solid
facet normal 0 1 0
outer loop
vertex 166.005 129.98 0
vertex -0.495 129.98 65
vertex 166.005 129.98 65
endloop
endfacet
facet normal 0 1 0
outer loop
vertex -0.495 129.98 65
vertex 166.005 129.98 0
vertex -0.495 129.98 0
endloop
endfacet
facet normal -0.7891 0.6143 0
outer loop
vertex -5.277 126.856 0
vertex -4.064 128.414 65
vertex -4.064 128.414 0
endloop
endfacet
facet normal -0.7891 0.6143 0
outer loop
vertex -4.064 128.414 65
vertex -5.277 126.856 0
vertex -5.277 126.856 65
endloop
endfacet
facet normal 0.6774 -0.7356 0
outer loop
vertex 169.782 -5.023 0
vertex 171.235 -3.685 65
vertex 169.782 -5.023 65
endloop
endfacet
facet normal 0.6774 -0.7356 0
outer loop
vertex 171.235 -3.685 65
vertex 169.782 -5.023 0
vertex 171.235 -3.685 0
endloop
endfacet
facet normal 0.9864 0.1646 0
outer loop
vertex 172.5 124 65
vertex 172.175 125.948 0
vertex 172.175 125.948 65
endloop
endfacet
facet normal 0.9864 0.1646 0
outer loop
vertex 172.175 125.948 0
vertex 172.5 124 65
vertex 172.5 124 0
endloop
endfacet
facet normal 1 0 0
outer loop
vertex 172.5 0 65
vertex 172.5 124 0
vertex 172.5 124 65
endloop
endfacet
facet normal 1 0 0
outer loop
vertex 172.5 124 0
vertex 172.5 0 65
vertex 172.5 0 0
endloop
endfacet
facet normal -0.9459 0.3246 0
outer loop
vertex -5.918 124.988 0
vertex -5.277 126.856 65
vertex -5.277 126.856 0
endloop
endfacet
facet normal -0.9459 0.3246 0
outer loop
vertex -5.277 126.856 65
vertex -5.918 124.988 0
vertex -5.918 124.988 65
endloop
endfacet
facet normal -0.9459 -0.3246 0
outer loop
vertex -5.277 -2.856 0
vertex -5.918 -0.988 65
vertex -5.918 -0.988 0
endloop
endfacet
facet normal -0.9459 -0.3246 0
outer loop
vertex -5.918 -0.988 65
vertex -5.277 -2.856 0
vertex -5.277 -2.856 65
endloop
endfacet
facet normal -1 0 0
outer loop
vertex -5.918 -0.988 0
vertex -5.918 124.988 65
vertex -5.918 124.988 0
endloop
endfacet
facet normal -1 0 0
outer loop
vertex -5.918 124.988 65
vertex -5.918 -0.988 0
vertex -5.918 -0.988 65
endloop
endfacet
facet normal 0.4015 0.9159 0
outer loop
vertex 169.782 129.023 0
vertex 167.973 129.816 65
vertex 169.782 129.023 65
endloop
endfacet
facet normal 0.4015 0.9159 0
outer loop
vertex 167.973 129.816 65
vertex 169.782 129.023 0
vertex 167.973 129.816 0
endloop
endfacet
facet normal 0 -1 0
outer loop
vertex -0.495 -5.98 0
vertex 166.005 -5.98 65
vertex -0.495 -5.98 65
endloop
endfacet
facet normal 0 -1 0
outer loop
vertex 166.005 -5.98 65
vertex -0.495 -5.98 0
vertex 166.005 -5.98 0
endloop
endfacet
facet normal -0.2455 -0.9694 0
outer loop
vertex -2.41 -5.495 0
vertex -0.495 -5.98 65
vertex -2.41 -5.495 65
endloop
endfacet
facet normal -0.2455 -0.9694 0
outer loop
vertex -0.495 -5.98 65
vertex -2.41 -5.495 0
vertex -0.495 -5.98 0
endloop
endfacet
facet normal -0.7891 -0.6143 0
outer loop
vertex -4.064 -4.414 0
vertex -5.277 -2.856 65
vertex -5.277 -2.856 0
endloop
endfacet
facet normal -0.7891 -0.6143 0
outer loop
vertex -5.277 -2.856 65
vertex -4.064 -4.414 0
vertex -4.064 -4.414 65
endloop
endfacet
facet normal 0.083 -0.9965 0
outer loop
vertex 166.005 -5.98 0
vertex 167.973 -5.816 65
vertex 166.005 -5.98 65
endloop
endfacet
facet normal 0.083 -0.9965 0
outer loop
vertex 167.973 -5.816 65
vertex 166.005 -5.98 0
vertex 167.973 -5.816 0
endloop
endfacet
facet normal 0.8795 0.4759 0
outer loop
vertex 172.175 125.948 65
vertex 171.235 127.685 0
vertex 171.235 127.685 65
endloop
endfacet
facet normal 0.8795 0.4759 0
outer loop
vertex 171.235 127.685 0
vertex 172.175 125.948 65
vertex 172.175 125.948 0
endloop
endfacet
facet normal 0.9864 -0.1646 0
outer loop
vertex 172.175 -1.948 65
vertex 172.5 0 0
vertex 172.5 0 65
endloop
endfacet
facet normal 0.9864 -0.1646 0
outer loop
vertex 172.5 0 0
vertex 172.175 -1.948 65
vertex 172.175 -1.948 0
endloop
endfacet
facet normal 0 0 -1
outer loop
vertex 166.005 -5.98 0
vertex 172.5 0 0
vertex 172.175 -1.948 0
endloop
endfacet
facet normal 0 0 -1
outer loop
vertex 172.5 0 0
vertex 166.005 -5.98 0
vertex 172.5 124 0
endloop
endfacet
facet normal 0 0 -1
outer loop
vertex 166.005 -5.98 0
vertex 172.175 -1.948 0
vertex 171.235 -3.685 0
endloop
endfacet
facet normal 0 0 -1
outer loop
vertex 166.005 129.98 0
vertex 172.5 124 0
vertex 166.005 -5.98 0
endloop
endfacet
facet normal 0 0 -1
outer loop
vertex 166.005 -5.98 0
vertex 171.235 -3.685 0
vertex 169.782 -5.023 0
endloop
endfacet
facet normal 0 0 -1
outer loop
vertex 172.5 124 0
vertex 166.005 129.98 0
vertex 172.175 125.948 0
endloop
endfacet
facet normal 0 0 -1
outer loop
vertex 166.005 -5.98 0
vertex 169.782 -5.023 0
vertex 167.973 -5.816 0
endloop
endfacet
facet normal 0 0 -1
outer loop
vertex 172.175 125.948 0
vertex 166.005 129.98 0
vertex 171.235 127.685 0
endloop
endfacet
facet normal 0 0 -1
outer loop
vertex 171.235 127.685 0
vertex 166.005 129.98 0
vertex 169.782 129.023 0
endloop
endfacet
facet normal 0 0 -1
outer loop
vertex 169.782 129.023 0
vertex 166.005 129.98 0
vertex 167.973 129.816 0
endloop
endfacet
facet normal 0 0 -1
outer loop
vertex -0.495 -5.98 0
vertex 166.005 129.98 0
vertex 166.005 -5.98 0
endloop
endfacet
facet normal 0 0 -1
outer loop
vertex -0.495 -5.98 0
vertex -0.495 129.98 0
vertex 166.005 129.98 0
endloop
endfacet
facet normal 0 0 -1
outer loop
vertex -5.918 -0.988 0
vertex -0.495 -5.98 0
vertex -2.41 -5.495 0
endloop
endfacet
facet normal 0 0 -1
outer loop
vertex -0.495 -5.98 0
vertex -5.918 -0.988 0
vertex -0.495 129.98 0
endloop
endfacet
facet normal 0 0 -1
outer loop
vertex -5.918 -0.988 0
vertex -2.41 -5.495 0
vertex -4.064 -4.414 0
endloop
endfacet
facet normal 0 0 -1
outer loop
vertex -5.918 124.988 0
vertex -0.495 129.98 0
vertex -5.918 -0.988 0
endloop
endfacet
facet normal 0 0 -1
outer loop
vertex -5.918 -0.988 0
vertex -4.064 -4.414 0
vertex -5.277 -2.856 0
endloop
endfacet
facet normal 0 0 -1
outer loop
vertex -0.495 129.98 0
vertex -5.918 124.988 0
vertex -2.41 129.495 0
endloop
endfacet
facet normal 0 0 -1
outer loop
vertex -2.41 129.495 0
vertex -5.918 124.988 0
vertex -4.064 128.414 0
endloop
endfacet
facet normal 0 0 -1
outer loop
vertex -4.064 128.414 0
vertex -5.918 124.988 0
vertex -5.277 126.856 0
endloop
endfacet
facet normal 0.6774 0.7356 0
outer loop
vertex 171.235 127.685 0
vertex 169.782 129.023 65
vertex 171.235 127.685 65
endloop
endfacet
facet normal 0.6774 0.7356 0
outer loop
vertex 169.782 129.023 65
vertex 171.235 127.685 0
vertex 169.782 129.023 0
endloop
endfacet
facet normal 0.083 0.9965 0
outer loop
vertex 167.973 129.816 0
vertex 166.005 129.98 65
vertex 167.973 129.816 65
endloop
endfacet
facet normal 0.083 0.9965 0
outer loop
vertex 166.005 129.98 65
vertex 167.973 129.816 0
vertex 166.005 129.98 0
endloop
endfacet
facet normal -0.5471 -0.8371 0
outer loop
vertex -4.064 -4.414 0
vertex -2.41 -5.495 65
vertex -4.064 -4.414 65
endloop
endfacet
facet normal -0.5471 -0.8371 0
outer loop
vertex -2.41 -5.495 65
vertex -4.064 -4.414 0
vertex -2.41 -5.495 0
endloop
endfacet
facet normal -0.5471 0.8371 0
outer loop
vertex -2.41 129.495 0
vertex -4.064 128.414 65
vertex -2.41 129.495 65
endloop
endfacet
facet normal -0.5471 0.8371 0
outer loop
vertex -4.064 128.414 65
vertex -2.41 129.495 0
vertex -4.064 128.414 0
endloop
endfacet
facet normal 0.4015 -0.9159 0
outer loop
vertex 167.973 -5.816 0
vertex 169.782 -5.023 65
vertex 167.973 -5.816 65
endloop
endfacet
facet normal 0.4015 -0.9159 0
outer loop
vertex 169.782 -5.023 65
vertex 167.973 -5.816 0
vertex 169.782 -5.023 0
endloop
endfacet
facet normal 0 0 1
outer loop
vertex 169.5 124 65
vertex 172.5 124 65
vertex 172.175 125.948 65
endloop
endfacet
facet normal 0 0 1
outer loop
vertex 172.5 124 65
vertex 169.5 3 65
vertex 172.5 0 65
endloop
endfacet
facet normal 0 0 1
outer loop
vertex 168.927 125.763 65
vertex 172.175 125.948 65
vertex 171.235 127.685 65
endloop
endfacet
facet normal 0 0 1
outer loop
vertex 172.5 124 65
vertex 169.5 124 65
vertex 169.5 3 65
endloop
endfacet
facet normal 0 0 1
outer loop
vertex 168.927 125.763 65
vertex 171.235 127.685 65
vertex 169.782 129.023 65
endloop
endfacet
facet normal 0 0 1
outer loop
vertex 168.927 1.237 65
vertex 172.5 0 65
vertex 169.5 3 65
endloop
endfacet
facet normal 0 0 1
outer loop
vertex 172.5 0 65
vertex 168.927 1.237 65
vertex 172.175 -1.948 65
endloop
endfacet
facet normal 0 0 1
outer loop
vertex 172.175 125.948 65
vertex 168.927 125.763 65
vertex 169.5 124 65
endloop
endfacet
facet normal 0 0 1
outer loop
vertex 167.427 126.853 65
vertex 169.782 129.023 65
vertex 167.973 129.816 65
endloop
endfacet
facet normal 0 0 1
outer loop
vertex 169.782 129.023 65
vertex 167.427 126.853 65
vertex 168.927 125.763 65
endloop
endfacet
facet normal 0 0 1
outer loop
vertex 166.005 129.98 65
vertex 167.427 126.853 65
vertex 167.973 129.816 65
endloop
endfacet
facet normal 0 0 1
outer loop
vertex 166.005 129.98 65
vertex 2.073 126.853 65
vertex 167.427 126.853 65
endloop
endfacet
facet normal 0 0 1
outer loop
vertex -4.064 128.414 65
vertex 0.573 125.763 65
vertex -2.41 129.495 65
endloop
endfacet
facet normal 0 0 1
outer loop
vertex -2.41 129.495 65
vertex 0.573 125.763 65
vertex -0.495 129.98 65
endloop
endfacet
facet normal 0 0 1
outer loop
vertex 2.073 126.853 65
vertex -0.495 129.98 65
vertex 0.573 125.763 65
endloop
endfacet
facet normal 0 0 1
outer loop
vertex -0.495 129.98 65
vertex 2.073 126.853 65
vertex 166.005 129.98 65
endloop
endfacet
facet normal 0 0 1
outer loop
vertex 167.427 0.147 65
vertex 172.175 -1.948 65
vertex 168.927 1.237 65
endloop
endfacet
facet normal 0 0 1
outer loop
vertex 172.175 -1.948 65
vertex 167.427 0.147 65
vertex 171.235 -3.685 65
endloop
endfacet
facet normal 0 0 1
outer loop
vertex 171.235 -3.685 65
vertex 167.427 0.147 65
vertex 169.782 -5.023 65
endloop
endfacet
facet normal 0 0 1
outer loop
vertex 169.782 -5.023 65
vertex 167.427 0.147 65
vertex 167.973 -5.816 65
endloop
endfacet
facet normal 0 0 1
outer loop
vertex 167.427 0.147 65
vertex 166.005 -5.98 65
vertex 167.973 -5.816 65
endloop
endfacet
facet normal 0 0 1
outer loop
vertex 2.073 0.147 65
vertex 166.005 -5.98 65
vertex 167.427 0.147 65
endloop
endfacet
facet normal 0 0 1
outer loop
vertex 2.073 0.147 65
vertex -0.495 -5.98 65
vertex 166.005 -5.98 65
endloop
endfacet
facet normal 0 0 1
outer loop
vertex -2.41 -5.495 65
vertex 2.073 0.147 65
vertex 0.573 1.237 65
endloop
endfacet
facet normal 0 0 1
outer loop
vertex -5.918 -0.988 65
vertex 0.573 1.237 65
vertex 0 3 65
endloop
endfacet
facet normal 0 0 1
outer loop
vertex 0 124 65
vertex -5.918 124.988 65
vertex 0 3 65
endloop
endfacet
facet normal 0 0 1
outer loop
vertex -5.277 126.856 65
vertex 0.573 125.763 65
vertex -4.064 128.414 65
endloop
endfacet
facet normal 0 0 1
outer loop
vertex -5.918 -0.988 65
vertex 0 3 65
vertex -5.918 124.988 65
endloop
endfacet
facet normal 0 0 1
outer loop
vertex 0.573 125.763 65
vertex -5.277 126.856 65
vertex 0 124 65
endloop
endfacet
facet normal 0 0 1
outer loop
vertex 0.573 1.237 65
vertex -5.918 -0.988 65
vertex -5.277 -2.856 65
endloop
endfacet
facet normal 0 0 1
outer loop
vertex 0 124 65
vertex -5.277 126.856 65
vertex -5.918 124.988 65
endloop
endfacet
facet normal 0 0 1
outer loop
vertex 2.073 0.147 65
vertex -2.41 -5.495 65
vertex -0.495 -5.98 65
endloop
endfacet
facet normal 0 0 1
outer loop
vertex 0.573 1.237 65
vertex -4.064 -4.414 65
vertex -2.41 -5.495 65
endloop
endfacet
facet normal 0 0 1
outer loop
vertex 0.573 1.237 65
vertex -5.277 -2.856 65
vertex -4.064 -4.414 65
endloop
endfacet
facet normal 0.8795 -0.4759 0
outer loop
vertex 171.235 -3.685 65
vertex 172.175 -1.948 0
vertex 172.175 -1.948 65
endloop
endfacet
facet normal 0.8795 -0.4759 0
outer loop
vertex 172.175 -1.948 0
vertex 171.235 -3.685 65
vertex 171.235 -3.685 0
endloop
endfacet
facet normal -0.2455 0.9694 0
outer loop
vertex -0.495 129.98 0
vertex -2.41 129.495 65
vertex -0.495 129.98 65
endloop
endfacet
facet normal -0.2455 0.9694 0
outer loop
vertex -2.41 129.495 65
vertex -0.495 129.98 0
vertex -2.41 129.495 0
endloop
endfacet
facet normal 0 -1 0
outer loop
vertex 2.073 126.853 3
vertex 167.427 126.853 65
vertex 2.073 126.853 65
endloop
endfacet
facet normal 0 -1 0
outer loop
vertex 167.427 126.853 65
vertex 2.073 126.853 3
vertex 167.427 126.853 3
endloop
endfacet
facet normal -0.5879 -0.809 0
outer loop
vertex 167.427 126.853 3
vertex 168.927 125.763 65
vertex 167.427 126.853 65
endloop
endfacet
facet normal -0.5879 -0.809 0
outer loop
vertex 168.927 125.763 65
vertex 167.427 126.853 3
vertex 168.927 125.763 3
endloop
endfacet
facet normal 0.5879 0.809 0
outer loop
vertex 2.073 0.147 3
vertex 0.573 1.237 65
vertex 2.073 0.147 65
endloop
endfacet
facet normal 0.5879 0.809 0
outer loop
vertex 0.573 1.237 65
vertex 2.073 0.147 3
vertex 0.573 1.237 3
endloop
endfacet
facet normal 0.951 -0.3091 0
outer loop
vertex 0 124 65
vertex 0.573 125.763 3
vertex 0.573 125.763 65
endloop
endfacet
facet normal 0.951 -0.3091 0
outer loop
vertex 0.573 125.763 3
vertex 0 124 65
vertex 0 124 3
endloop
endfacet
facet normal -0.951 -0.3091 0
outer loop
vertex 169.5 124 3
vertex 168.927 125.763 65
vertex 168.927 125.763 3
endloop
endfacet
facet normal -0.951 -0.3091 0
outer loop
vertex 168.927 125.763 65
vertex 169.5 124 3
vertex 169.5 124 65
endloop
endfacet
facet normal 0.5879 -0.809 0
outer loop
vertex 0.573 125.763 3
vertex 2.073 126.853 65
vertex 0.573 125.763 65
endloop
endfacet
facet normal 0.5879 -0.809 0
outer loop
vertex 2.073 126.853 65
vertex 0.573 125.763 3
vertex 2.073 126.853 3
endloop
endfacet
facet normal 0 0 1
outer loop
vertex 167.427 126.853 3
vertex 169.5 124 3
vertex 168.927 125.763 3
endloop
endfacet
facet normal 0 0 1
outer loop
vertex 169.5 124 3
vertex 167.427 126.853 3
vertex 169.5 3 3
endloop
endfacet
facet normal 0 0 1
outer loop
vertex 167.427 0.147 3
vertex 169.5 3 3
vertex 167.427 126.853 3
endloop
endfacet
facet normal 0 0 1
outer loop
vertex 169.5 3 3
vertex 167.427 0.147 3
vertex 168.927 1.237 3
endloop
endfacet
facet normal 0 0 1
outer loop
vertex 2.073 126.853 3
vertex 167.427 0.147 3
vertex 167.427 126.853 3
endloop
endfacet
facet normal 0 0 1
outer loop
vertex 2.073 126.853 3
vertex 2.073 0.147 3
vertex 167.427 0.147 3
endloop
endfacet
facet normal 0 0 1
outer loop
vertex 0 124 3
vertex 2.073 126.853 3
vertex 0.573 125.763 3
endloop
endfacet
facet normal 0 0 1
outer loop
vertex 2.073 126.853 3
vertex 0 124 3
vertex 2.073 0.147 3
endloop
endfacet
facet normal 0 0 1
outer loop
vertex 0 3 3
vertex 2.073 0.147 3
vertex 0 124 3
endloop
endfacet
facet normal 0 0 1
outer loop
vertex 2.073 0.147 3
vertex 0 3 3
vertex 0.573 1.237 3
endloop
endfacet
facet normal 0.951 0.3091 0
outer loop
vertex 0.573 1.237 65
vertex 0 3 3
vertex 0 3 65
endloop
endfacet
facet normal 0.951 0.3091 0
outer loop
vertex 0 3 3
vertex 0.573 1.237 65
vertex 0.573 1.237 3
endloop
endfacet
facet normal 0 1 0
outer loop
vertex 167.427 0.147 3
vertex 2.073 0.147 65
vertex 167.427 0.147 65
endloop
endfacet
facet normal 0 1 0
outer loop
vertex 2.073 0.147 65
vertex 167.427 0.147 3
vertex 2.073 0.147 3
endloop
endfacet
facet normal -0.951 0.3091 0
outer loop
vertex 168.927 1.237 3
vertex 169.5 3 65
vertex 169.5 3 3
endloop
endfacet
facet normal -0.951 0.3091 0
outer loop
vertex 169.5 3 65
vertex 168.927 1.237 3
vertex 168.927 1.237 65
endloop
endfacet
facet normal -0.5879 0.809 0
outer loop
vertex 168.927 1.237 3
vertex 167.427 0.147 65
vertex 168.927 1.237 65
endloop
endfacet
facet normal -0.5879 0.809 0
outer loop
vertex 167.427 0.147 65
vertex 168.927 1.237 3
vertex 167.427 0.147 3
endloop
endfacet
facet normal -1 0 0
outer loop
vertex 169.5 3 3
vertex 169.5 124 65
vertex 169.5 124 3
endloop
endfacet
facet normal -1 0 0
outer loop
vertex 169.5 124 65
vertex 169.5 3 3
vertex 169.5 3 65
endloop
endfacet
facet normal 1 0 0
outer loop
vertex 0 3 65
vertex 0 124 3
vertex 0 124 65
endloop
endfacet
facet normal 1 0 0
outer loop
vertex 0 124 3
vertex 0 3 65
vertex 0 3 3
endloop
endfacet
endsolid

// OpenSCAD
// Plug tray (12-cell kit) — REFERENCE MOCKUP (non-printable).
//
// Classification: reference_only (mockups playbook). NOT in parts.json.
// Approximates the plug tray the seed tray nests under, per the 12-cell kit
// marketing dimensions.
//
// Source: kit marketing figures recorded 2026-09-17 (journal + session notes):
//   plug tray  6.79 in (172.5 mm) L x 5.12 in (130 mm) W x 2.56 in (65 mm) H
//   lid        3.94 in (100.1 mm) H
// UNCERTAINTY: marketing/retail figures, not measured. Placeholder geometry
// only — do NOT treat as a functional interface.

plug_tray_12_l = is_undef(plug_tray_12_l) ? 172.5 : plug_tray_12_l;
plug_tray_12_w = is_undef(plug_tray_12_w) ? 130.0 : plug_tray_12_w;
plug_tray_12_h = is_undef(plug_tray_12_h) ? 65.0  : plug_tray_12_h;
plug_tray_12_wall = is_undef(plug_tray_12_wall) ? 3.0 : plug_tray_12_wall;
plug_tray_12_corner = is_undef(plug_tray_12_corner) ? 6.0 : plug_tray_12_corner;

module _rounded_box_12(L, W, H, r) {
    r = min(r, min(L, W) / 2);
    hull() {
        cylinder(h = H, r = r);
        translate([L - r, 0, 0]) cylinder(h = H, r = r);
        translate([L - r, W - r, 0]) cylinder(h = H, r = r);
        translate([0, W - r, 0]) cylinder(h = H, r = r);
    }
}

// Open-topped plug tray (placeholder; 3 x 4 cell grid is implied, not modeled).
module plug_tray_12cell() {
    difference() {
        _rounded_box_12(plug_tray_12_l, plug_tray_12_w, plug_tray_12_h, plug_tray_12_corner);
        translate([plug_tray_12_wall, plug_tray_12_wall, plug_tray_12_wall])
            _rounded_box_12(
                plug_tray_12_l - 2 * plug_tray_12_wall,
                plug_tray_12_w - 2 * plug_tray_12_wall,
                plug_tray_12_h + 1,
                max(plug_tray_12_corner - plug_tray_12_wall, 0.1)
            );
    }
}

plug_tray_12cell();
